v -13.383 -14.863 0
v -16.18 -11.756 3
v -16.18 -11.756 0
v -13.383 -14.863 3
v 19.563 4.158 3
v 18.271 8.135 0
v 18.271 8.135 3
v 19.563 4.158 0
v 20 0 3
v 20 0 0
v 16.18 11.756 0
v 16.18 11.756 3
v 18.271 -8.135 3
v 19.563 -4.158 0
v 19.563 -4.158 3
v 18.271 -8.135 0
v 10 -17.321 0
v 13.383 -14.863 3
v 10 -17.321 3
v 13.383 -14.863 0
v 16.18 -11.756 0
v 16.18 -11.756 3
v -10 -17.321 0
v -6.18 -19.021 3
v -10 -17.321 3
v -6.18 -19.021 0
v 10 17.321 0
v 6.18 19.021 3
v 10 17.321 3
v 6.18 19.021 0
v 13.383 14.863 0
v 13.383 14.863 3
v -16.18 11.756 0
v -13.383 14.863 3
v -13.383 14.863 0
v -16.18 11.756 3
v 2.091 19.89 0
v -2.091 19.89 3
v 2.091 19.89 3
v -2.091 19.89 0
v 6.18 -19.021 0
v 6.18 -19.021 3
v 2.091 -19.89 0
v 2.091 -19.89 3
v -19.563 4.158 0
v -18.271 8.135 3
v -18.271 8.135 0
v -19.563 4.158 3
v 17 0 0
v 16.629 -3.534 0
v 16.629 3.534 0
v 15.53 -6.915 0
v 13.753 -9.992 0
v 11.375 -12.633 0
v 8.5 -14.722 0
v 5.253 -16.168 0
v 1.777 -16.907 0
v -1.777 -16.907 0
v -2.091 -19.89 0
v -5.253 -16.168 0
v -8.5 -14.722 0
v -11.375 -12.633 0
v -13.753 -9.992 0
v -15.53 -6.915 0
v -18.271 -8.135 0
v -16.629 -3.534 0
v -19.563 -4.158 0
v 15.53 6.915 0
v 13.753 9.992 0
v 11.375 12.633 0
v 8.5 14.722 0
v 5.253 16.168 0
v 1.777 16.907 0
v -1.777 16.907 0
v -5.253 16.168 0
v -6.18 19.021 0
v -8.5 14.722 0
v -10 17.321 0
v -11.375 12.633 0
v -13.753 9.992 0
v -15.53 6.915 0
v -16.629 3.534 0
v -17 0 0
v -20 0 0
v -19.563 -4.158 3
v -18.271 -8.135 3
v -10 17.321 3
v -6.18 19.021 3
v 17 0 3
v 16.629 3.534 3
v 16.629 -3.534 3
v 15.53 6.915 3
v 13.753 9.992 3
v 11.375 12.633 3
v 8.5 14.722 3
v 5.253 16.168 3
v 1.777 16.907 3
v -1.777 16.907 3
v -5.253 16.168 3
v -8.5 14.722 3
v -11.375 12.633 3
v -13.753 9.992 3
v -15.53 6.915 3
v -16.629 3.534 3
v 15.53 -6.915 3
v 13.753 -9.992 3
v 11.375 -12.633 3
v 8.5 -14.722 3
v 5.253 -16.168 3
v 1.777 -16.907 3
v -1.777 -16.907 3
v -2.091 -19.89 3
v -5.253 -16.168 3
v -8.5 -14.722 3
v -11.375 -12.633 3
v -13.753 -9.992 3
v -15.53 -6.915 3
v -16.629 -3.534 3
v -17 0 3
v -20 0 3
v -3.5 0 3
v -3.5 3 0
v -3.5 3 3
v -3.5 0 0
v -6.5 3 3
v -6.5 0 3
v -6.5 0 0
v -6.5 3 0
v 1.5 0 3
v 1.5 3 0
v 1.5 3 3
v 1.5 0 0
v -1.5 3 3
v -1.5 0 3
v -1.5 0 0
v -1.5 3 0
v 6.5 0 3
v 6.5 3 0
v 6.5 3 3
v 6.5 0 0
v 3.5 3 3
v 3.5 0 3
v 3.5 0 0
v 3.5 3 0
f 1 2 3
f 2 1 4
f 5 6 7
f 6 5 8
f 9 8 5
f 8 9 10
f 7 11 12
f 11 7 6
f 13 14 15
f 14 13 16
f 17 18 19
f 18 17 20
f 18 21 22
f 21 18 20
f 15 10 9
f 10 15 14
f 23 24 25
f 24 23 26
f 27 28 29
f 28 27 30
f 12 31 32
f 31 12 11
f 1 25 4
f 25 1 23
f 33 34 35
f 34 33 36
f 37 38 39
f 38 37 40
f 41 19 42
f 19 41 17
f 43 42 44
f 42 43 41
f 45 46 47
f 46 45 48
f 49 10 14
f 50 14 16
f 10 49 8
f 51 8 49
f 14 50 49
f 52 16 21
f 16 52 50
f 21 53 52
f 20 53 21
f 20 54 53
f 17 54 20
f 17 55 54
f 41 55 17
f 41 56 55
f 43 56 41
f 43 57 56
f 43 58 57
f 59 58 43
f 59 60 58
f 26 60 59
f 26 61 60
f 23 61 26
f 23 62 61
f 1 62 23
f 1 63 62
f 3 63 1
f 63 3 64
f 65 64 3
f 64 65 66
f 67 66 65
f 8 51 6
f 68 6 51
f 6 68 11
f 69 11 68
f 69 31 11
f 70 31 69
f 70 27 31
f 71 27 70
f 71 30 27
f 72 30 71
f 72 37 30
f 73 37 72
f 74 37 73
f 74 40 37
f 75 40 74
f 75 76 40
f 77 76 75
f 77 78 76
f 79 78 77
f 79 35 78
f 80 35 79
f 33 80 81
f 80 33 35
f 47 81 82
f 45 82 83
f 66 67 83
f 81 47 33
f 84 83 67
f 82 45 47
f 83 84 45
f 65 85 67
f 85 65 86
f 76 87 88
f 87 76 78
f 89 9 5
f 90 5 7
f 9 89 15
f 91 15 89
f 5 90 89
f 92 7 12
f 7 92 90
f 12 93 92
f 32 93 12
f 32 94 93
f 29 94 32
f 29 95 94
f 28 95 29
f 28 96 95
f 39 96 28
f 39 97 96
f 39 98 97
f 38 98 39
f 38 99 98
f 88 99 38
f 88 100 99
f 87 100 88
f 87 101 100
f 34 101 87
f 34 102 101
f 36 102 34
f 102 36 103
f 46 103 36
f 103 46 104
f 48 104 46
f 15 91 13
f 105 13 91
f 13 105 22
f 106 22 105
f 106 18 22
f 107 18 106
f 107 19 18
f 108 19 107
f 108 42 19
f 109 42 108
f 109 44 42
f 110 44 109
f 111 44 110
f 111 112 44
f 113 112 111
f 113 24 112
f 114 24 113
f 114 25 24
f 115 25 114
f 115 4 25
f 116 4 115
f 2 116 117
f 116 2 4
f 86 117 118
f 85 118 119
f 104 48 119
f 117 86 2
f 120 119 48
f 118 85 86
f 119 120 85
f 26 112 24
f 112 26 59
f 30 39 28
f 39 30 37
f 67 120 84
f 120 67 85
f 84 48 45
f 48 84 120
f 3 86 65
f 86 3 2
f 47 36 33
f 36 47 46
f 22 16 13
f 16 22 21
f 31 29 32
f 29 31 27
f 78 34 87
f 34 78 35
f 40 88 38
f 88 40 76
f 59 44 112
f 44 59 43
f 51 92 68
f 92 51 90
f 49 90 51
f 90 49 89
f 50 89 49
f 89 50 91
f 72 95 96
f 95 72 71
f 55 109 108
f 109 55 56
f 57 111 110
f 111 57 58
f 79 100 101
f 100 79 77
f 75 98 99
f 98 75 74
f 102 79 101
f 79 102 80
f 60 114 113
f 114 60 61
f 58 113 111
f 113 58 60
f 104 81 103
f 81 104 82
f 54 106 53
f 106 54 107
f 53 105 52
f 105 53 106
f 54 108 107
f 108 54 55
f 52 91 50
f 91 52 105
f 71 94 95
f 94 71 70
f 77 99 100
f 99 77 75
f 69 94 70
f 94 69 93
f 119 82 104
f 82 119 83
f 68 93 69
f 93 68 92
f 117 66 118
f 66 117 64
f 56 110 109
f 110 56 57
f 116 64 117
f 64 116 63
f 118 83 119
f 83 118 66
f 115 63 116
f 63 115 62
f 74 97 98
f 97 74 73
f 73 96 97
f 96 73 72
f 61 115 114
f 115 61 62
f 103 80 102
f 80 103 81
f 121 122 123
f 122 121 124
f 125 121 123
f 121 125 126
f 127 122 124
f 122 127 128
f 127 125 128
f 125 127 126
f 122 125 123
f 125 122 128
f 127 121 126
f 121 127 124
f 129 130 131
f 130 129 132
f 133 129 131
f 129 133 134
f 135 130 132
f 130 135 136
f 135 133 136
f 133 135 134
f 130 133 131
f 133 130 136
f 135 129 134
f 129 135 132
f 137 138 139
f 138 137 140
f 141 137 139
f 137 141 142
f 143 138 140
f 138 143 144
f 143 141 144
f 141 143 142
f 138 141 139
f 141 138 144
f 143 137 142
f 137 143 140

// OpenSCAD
difference() {
    cylinder(r=20, h=3);
    cylinder(r=17, h=4);
}
translate([-6.5, 0, 0]) {
    cube(3);
}
translate([-1.5, 0, 0]) {
    cube(3);
}
translate([3.5, 0, 0]) {
    cube(3);
}
